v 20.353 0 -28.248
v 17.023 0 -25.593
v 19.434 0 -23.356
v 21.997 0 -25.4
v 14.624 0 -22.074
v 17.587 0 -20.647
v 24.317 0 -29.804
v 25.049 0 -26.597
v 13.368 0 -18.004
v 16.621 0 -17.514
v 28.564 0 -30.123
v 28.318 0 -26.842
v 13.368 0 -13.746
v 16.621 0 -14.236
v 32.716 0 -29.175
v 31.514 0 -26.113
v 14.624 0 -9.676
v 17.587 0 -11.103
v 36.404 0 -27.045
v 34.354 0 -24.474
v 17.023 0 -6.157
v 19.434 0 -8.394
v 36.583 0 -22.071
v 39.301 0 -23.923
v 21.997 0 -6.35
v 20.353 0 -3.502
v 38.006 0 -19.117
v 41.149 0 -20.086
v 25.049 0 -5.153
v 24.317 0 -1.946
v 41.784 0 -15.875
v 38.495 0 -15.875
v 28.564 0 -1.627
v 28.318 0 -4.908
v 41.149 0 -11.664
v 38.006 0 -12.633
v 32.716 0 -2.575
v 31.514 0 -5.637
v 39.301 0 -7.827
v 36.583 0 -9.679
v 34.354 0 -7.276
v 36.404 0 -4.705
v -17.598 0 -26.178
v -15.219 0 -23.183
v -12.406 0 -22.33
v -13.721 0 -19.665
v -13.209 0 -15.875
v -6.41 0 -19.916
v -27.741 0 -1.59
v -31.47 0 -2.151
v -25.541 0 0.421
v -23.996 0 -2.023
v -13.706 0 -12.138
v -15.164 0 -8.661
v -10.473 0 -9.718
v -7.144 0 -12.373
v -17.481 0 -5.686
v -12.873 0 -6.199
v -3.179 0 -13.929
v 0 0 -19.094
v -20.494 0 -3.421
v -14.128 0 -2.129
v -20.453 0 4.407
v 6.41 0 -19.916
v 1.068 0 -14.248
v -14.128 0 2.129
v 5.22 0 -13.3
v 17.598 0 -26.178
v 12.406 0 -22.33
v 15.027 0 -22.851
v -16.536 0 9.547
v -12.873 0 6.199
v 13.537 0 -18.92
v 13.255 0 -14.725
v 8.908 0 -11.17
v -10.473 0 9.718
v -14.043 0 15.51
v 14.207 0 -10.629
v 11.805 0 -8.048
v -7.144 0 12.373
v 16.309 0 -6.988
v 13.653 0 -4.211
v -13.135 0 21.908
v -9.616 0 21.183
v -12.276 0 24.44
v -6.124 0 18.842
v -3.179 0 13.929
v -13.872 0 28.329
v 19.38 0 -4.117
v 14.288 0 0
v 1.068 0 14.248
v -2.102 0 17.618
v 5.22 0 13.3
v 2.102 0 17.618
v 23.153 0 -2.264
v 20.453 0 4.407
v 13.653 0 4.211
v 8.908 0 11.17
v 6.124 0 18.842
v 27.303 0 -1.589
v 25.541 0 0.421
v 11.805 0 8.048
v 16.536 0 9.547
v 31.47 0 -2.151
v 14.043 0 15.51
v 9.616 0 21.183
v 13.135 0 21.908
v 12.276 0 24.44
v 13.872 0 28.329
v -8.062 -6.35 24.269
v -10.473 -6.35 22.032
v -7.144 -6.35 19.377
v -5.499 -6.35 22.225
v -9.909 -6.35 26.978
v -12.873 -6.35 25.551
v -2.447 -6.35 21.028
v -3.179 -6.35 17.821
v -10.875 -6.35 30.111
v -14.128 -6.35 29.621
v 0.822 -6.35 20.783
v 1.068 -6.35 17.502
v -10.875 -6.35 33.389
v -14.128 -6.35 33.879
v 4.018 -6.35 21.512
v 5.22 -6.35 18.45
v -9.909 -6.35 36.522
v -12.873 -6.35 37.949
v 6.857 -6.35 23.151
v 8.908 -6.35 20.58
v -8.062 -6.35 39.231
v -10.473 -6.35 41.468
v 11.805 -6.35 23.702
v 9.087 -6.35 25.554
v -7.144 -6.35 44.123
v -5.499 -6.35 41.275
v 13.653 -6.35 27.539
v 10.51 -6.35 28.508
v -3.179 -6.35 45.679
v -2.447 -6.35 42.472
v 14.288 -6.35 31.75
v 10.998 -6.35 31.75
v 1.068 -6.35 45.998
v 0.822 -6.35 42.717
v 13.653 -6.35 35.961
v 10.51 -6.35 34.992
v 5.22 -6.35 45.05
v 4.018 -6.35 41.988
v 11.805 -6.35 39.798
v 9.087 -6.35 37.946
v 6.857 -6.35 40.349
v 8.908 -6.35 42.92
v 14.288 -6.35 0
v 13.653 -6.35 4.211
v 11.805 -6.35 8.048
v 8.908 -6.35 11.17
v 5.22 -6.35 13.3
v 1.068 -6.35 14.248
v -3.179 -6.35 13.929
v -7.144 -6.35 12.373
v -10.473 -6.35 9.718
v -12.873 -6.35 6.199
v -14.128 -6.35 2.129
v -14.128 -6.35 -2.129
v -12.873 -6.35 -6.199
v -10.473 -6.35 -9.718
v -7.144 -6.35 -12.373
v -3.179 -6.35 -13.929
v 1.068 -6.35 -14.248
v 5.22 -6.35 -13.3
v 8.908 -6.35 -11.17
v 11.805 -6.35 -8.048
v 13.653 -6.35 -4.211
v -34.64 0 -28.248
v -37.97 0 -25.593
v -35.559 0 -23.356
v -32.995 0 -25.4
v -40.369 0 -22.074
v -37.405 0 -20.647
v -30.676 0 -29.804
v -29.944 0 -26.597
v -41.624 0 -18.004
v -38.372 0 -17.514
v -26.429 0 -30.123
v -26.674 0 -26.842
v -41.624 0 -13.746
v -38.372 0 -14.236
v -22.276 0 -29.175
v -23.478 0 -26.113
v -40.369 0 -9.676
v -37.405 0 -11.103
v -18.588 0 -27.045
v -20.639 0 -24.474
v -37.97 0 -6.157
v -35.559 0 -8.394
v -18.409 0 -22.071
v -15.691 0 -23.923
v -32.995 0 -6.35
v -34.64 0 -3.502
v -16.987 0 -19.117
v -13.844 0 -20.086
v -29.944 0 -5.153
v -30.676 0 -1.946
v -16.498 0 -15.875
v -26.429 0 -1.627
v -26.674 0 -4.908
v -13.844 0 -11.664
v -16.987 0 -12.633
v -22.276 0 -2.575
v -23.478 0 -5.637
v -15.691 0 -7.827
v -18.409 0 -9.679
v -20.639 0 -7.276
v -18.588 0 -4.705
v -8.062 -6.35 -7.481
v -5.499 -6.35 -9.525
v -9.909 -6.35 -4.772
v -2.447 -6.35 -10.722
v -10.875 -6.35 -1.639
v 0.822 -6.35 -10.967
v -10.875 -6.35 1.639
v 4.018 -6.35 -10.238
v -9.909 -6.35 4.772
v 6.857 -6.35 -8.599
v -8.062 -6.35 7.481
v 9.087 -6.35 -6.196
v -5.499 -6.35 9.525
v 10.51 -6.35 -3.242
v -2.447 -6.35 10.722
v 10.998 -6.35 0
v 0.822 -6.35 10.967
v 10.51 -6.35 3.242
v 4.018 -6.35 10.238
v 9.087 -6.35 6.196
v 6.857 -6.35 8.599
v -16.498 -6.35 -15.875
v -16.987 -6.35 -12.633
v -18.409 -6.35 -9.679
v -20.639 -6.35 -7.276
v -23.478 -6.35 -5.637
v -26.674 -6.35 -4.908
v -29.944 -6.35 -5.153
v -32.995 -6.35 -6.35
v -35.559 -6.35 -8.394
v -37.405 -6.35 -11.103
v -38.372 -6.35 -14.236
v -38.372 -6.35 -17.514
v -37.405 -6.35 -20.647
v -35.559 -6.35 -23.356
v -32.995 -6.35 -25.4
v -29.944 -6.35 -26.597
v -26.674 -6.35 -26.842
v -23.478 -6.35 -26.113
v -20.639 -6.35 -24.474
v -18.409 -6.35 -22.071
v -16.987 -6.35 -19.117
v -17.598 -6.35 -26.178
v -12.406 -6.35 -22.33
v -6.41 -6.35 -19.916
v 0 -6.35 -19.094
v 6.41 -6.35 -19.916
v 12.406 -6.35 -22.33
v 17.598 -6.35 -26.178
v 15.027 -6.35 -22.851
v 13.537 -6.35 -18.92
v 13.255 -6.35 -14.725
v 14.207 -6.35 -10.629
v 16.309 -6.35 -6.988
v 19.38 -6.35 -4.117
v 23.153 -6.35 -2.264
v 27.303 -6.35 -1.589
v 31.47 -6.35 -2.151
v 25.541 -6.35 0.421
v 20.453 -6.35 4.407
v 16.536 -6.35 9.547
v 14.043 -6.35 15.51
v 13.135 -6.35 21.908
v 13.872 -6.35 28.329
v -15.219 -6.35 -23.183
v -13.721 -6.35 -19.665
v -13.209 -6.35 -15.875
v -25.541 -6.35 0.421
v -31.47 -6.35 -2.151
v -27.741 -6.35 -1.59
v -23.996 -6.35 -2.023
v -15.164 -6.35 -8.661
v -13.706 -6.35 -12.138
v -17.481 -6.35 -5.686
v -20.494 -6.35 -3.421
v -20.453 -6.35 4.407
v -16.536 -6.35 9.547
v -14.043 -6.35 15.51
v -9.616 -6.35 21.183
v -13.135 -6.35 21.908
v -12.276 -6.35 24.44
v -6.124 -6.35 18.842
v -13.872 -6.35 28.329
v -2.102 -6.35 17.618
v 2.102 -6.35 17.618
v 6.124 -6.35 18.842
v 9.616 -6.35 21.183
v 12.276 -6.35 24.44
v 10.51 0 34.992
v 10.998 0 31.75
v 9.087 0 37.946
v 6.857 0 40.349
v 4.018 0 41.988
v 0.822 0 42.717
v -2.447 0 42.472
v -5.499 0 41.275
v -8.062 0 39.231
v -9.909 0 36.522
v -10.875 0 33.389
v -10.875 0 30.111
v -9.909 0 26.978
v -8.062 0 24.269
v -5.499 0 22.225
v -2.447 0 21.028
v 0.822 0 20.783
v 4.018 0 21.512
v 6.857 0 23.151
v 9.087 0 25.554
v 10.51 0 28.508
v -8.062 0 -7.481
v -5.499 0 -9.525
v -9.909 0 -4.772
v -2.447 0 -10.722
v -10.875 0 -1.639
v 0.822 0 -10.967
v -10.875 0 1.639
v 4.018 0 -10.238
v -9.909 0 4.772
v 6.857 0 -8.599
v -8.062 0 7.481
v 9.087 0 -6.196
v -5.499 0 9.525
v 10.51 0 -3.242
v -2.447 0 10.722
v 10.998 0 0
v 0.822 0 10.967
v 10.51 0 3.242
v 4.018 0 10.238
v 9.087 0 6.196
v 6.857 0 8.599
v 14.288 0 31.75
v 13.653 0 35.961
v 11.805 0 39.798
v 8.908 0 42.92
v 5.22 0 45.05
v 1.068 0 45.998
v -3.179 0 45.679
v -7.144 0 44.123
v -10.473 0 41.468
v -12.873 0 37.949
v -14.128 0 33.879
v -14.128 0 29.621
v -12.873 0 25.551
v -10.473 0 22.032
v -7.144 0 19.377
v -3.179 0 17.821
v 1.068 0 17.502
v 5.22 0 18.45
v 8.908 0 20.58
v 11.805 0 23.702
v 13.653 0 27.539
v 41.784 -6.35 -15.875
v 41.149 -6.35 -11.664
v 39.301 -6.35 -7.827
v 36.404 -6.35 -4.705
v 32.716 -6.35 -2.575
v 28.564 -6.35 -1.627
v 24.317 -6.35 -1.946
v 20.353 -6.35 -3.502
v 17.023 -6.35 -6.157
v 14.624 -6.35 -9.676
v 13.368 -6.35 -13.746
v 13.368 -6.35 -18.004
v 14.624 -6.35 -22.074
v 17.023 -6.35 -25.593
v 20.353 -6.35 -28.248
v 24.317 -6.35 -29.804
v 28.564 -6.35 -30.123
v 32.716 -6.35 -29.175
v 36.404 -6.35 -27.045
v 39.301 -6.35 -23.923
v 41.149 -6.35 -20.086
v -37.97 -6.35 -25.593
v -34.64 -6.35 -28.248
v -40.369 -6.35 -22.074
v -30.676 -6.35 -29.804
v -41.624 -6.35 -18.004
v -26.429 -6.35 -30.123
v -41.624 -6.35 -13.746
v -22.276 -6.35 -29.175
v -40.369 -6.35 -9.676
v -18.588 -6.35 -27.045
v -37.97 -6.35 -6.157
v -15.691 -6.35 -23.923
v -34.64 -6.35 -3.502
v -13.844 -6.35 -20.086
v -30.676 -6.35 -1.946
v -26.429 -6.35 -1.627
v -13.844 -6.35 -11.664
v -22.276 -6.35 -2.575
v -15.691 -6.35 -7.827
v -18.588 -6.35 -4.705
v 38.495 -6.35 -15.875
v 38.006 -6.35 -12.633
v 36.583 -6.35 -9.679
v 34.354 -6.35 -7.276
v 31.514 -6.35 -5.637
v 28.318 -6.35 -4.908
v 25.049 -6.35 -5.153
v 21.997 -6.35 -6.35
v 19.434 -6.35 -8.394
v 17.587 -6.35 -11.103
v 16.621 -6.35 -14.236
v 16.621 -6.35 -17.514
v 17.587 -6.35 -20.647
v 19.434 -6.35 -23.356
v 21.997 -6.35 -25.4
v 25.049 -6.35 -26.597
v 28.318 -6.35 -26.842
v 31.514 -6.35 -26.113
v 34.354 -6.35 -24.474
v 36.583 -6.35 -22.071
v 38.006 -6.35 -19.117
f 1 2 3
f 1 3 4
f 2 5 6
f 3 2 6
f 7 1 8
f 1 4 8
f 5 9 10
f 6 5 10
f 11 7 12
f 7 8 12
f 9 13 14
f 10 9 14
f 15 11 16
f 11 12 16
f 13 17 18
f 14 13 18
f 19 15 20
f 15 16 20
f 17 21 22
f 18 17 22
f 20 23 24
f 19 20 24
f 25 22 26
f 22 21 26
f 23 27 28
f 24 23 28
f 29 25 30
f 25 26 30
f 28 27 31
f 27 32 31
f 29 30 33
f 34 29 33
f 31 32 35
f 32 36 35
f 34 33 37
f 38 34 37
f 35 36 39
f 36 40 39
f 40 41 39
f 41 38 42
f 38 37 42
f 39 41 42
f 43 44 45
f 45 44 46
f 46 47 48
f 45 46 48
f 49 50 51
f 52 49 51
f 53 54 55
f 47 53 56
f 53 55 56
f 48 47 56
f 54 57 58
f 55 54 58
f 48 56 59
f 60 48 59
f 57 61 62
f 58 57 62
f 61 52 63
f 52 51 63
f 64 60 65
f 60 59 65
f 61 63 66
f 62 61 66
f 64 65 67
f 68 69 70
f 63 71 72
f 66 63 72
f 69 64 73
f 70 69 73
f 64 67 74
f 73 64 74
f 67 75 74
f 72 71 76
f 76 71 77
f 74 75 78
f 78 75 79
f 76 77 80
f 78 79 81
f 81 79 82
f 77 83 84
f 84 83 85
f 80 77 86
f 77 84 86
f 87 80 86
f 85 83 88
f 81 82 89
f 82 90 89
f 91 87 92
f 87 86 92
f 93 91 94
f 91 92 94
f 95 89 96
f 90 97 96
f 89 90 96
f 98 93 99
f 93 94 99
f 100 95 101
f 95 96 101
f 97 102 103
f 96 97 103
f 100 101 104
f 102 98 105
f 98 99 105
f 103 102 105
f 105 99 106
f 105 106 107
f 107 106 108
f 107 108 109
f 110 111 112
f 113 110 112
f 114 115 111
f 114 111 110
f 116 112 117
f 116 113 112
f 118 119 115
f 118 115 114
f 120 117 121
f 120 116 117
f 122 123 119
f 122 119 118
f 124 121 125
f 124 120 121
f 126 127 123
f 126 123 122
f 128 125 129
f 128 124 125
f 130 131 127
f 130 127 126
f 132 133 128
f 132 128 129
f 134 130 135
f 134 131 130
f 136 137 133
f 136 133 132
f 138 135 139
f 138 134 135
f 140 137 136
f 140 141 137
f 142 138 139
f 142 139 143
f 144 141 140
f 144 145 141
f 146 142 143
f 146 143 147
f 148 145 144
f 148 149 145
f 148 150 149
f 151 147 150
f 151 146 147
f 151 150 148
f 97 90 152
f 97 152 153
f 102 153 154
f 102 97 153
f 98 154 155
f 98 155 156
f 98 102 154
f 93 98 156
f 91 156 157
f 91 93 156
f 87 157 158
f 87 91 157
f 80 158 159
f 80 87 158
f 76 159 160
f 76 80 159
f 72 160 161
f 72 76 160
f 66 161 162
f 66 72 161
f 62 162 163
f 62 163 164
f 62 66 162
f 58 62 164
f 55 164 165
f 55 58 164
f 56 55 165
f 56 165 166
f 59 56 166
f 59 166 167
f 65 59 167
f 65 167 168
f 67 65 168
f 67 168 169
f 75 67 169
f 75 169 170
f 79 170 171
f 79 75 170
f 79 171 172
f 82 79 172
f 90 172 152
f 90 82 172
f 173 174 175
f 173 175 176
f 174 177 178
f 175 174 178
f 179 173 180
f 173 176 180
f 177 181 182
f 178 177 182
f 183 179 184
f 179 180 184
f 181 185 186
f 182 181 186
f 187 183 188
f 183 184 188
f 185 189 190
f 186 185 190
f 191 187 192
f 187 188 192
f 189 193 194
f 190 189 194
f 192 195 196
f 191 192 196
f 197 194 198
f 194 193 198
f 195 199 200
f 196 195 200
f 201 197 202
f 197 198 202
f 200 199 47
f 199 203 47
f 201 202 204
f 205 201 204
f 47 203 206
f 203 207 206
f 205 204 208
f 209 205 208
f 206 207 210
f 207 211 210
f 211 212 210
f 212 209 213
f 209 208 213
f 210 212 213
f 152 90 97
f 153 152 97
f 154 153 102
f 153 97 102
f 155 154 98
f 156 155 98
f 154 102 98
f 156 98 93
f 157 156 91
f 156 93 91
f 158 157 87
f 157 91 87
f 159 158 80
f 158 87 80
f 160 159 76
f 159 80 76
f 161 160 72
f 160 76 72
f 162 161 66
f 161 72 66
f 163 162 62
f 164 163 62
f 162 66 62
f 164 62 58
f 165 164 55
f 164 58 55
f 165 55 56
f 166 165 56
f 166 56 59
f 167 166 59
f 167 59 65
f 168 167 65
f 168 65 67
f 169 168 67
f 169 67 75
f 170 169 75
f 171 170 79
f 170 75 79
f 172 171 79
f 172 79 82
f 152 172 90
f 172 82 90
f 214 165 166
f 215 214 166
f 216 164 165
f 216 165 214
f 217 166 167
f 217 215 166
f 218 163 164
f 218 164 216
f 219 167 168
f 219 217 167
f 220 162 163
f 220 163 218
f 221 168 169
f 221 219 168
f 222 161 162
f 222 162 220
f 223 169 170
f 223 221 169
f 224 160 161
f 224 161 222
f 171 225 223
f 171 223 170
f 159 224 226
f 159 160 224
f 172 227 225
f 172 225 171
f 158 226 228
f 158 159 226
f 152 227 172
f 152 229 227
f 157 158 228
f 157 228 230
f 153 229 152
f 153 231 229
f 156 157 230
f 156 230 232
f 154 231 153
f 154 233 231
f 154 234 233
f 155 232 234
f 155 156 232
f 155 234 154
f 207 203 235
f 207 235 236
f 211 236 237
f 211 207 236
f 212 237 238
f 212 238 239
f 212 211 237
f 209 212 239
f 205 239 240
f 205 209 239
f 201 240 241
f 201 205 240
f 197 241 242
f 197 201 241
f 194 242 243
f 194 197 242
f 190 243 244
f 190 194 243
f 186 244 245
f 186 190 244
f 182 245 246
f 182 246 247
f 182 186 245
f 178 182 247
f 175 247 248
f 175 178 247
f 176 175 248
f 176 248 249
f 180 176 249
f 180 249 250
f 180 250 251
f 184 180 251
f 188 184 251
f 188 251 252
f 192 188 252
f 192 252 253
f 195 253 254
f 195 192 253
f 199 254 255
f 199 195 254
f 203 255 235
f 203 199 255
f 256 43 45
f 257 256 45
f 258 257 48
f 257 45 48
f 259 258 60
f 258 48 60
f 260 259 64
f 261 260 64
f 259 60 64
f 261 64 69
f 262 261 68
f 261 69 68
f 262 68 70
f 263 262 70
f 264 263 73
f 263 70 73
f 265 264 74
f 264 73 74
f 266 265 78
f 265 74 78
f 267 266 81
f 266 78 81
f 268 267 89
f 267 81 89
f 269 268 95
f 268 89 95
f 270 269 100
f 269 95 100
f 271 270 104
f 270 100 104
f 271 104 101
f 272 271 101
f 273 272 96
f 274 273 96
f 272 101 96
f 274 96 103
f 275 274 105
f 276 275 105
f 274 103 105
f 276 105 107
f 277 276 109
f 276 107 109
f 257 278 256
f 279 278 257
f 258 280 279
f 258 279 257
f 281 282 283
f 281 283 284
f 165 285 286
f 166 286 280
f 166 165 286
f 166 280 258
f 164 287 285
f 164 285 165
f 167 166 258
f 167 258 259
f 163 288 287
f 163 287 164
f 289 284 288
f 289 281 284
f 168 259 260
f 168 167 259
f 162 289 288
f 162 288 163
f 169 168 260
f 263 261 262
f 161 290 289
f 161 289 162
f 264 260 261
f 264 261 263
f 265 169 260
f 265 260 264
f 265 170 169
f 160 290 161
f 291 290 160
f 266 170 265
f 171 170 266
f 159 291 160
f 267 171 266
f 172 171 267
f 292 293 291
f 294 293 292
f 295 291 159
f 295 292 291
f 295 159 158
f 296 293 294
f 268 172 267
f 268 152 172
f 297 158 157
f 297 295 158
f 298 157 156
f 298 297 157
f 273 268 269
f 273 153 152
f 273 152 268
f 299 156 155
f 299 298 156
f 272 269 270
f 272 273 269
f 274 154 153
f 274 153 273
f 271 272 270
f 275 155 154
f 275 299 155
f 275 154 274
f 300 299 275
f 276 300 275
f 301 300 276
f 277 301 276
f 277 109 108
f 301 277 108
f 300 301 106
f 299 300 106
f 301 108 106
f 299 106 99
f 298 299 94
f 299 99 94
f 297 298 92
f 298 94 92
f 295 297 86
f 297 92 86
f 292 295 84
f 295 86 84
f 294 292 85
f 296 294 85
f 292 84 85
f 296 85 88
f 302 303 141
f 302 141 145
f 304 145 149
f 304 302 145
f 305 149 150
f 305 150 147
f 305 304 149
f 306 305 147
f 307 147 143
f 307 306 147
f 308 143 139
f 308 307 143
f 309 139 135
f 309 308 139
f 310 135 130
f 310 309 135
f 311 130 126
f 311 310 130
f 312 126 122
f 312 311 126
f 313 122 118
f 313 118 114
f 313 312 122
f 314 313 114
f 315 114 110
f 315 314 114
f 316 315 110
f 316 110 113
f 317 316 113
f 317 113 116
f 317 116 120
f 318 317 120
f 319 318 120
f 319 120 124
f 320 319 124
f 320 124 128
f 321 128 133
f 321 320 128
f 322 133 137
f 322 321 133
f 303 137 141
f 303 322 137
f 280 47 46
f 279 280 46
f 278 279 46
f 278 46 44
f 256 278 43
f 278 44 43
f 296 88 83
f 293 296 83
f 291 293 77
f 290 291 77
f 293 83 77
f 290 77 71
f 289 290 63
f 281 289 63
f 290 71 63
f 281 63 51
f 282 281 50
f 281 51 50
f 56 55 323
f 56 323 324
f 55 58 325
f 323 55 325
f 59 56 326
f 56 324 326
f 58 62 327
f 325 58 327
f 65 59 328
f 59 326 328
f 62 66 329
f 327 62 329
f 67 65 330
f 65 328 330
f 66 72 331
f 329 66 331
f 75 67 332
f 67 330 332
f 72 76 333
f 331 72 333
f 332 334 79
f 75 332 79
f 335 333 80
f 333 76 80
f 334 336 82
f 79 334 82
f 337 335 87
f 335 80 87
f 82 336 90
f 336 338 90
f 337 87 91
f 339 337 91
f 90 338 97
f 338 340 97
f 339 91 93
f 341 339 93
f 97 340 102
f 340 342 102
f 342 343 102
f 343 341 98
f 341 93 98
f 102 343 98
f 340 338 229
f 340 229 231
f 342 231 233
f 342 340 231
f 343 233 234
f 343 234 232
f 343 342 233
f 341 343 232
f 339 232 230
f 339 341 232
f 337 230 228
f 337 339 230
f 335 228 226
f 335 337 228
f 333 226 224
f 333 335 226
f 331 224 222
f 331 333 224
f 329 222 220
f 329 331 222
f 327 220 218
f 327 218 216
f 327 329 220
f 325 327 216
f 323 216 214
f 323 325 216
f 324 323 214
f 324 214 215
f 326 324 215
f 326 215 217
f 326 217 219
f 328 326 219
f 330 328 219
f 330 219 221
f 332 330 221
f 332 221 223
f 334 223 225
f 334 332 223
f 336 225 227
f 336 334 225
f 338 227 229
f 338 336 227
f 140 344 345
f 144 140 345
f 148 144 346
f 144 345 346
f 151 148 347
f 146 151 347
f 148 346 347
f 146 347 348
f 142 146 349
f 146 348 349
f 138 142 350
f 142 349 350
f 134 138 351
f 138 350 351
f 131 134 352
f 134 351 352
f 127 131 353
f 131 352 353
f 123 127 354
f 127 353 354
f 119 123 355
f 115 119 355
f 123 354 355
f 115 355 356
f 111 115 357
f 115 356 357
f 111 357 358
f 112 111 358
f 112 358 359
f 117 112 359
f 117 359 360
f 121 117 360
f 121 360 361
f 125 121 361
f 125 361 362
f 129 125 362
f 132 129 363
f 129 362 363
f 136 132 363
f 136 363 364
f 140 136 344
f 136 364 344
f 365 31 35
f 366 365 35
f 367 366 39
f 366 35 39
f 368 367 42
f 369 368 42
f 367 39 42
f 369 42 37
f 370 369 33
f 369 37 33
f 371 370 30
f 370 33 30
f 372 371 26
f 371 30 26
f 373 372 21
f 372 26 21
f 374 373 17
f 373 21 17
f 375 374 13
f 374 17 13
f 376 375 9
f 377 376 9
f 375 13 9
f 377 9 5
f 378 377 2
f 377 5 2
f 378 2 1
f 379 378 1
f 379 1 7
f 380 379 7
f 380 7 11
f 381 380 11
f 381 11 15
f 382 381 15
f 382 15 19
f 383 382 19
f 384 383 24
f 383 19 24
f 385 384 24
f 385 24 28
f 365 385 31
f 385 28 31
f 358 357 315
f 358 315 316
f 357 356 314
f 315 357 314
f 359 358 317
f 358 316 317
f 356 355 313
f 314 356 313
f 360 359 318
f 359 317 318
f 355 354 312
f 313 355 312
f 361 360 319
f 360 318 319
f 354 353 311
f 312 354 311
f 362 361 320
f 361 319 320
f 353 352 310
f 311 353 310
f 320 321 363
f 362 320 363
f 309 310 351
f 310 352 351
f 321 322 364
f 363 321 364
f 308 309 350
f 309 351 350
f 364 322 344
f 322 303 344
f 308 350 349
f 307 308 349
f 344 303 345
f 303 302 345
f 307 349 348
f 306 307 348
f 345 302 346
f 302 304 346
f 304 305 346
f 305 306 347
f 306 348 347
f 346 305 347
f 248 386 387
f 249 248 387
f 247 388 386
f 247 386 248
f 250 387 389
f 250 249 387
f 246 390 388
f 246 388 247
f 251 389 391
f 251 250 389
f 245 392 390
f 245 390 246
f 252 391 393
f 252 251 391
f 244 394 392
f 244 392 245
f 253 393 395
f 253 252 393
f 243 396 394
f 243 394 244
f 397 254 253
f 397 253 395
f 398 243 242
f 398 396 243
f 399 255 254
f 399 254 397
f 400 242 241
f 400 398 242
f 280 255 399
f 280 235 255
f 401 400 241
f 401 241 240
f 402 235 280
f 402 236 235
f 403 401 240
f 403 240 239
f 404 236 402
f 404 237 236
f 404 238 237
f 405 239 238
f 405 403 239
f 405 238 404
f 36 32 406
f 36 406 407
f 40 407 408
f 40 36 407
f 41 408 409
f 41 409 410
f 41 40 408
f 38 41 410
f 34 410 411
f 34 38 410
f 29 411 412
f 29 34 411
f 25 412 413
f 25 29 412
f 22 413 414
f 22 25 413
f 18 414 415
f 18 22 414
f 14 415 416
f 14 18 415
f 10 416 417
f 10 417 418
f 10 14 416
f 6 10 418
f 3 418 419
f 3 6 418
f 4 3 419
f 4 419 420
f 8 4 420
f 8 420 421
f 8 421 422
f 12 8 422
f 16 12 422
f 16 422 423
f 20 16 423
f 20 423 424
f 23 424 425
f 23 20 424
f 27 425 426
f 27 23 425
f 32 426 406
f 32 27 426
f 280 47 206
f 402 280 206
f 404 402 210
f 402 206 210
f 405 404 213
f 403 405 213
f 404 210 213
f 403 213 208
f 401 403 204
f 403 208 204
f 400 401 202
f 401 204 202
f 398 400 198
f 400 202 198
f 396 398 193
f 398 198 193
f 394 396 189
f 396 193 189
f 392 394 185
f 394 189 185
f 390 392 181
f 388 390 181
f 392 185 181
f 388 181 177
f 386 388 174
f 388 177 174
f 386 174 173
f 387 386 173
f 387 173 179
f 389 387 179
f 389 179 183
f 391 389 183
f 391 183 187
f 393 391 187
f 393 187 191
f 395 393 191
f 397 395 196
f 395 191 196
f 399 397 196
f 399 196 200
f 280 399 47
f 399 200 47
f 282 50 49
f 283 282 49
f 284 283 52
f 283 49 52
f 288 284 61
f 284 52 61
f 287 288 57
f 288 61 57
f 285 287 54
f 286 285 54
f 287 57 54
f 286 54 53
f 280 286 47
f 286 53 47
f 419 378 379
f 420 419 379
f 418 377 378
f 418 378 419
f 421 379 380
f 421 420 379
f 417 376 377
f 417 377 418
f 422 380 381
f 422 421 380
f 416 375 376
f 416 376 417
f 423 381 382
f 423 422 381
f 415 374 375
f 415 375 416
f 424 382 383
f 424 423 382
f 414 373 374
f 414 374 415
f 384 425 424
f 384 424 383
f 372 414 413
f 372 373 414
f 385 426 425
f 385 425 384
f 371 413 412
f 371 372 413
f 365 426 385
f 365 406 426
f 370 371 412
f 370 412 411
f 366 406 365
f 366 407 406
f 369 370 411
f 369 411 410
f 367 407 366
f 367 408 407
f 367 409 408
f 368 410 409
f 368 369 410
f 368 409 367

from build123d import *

# Parameters (mm, degrees)
F0_R     = 14.2875
F0_R_2   = 10.9982
F2_DEPTH = 6.35
F1_R     = 14.2875


with BuildPart() as f2:
    # F0 (on Front) → F2 (new body)
    with BuildSketch(Plane.XZ):
        with Locations((-27.4963065702, -15.875)):
            Circle(F0_R)
        with Locations((-27.4963065702, -15.875)):
            Circle(F0_R_2, mode=Mode.SUBTRACT)
    extrude(amount=F2_DEPTH)


with BuildPart() as f2b:
    # F0 (on Front) → F2, piece 2 (new body)
    with BuildSketch(Plane.XZ):
        Circle(F0_R)
        Circle(F0_R_2, mode=Mode.SUBTRACT)
    extrude(amount=F2_DEPTH)


with BuildPart() as f2c:
    # F0 (on Front) → F2, piece 3 (new body)
    with BuildSketch(Plane.XZ):
        with Locations((0, 31.75)):
            Circle(F0_R)
        with Locations((0, 31.75)):
            Circle(F0_R_2, mode=Mode.SUBTRACT)
    extrude(amount=F2_DEPTH)


with BuildPart() as f2d:
    # F0 (on Front) → F2, piece 4 (new body)
    with BuildSketch(Plane.XZ):
        with Locations((27.4963065702, -15.875)):
            Circle(F0_R)
        with Locations((27.4963065702, -15.875)):
            Circle(F0_R_2, mode=Mode.SUBTRACT)
    extrude(amount=F2_DEPTH)


with BuildPart() as f2e:
    # F1 (on Front) → F2, piece 5 (new body)
    with BuildSketch(Plane.XZ):
        with BuildLine():
            ThreePointArc((-13.8718760728, 28.3289313848), (-16.5359438351, 9.5470316245), (-31.4695122777, -2.1510686152))
            ThreePointArc((-31.4695122777, -2.1510686152), (-18.912441482, -4.4535326513), (-13.2088065702, -15.875))
            ThreePointArc((-13.2088065702, -15.875), (-14.3517276668, -21.4743483284), (-17.5976362049, -26.1778627696))
            ThreePointArc((-17.5976362049, -26.1778627696), (0, -19.094063249), (17.5976362049, -26.1778627696))
            ThreePointArc((17.5976362049, -26.1778627696), (15.1229686136, -8.73125), (31.4695122777, -2.1510686152))
            ThreePointArc((31.4695122777, -2.1510686152), (16.5359438351, 9.5470316245), (13.8718760728, 28.3289313848))
            ThreePointArc((13.8718760728, 28.3289313848), (0, 17.4625), (-13.8718760728, 28.3289313848))
        make_face()
        Circle(F1_R, mode=Mode.SUBTRACT)
    extrude(amount=F2_DEPTH)


solid = Compound([f2.part, f2b.part, f2c.part, f2d.part, f2e.part])
